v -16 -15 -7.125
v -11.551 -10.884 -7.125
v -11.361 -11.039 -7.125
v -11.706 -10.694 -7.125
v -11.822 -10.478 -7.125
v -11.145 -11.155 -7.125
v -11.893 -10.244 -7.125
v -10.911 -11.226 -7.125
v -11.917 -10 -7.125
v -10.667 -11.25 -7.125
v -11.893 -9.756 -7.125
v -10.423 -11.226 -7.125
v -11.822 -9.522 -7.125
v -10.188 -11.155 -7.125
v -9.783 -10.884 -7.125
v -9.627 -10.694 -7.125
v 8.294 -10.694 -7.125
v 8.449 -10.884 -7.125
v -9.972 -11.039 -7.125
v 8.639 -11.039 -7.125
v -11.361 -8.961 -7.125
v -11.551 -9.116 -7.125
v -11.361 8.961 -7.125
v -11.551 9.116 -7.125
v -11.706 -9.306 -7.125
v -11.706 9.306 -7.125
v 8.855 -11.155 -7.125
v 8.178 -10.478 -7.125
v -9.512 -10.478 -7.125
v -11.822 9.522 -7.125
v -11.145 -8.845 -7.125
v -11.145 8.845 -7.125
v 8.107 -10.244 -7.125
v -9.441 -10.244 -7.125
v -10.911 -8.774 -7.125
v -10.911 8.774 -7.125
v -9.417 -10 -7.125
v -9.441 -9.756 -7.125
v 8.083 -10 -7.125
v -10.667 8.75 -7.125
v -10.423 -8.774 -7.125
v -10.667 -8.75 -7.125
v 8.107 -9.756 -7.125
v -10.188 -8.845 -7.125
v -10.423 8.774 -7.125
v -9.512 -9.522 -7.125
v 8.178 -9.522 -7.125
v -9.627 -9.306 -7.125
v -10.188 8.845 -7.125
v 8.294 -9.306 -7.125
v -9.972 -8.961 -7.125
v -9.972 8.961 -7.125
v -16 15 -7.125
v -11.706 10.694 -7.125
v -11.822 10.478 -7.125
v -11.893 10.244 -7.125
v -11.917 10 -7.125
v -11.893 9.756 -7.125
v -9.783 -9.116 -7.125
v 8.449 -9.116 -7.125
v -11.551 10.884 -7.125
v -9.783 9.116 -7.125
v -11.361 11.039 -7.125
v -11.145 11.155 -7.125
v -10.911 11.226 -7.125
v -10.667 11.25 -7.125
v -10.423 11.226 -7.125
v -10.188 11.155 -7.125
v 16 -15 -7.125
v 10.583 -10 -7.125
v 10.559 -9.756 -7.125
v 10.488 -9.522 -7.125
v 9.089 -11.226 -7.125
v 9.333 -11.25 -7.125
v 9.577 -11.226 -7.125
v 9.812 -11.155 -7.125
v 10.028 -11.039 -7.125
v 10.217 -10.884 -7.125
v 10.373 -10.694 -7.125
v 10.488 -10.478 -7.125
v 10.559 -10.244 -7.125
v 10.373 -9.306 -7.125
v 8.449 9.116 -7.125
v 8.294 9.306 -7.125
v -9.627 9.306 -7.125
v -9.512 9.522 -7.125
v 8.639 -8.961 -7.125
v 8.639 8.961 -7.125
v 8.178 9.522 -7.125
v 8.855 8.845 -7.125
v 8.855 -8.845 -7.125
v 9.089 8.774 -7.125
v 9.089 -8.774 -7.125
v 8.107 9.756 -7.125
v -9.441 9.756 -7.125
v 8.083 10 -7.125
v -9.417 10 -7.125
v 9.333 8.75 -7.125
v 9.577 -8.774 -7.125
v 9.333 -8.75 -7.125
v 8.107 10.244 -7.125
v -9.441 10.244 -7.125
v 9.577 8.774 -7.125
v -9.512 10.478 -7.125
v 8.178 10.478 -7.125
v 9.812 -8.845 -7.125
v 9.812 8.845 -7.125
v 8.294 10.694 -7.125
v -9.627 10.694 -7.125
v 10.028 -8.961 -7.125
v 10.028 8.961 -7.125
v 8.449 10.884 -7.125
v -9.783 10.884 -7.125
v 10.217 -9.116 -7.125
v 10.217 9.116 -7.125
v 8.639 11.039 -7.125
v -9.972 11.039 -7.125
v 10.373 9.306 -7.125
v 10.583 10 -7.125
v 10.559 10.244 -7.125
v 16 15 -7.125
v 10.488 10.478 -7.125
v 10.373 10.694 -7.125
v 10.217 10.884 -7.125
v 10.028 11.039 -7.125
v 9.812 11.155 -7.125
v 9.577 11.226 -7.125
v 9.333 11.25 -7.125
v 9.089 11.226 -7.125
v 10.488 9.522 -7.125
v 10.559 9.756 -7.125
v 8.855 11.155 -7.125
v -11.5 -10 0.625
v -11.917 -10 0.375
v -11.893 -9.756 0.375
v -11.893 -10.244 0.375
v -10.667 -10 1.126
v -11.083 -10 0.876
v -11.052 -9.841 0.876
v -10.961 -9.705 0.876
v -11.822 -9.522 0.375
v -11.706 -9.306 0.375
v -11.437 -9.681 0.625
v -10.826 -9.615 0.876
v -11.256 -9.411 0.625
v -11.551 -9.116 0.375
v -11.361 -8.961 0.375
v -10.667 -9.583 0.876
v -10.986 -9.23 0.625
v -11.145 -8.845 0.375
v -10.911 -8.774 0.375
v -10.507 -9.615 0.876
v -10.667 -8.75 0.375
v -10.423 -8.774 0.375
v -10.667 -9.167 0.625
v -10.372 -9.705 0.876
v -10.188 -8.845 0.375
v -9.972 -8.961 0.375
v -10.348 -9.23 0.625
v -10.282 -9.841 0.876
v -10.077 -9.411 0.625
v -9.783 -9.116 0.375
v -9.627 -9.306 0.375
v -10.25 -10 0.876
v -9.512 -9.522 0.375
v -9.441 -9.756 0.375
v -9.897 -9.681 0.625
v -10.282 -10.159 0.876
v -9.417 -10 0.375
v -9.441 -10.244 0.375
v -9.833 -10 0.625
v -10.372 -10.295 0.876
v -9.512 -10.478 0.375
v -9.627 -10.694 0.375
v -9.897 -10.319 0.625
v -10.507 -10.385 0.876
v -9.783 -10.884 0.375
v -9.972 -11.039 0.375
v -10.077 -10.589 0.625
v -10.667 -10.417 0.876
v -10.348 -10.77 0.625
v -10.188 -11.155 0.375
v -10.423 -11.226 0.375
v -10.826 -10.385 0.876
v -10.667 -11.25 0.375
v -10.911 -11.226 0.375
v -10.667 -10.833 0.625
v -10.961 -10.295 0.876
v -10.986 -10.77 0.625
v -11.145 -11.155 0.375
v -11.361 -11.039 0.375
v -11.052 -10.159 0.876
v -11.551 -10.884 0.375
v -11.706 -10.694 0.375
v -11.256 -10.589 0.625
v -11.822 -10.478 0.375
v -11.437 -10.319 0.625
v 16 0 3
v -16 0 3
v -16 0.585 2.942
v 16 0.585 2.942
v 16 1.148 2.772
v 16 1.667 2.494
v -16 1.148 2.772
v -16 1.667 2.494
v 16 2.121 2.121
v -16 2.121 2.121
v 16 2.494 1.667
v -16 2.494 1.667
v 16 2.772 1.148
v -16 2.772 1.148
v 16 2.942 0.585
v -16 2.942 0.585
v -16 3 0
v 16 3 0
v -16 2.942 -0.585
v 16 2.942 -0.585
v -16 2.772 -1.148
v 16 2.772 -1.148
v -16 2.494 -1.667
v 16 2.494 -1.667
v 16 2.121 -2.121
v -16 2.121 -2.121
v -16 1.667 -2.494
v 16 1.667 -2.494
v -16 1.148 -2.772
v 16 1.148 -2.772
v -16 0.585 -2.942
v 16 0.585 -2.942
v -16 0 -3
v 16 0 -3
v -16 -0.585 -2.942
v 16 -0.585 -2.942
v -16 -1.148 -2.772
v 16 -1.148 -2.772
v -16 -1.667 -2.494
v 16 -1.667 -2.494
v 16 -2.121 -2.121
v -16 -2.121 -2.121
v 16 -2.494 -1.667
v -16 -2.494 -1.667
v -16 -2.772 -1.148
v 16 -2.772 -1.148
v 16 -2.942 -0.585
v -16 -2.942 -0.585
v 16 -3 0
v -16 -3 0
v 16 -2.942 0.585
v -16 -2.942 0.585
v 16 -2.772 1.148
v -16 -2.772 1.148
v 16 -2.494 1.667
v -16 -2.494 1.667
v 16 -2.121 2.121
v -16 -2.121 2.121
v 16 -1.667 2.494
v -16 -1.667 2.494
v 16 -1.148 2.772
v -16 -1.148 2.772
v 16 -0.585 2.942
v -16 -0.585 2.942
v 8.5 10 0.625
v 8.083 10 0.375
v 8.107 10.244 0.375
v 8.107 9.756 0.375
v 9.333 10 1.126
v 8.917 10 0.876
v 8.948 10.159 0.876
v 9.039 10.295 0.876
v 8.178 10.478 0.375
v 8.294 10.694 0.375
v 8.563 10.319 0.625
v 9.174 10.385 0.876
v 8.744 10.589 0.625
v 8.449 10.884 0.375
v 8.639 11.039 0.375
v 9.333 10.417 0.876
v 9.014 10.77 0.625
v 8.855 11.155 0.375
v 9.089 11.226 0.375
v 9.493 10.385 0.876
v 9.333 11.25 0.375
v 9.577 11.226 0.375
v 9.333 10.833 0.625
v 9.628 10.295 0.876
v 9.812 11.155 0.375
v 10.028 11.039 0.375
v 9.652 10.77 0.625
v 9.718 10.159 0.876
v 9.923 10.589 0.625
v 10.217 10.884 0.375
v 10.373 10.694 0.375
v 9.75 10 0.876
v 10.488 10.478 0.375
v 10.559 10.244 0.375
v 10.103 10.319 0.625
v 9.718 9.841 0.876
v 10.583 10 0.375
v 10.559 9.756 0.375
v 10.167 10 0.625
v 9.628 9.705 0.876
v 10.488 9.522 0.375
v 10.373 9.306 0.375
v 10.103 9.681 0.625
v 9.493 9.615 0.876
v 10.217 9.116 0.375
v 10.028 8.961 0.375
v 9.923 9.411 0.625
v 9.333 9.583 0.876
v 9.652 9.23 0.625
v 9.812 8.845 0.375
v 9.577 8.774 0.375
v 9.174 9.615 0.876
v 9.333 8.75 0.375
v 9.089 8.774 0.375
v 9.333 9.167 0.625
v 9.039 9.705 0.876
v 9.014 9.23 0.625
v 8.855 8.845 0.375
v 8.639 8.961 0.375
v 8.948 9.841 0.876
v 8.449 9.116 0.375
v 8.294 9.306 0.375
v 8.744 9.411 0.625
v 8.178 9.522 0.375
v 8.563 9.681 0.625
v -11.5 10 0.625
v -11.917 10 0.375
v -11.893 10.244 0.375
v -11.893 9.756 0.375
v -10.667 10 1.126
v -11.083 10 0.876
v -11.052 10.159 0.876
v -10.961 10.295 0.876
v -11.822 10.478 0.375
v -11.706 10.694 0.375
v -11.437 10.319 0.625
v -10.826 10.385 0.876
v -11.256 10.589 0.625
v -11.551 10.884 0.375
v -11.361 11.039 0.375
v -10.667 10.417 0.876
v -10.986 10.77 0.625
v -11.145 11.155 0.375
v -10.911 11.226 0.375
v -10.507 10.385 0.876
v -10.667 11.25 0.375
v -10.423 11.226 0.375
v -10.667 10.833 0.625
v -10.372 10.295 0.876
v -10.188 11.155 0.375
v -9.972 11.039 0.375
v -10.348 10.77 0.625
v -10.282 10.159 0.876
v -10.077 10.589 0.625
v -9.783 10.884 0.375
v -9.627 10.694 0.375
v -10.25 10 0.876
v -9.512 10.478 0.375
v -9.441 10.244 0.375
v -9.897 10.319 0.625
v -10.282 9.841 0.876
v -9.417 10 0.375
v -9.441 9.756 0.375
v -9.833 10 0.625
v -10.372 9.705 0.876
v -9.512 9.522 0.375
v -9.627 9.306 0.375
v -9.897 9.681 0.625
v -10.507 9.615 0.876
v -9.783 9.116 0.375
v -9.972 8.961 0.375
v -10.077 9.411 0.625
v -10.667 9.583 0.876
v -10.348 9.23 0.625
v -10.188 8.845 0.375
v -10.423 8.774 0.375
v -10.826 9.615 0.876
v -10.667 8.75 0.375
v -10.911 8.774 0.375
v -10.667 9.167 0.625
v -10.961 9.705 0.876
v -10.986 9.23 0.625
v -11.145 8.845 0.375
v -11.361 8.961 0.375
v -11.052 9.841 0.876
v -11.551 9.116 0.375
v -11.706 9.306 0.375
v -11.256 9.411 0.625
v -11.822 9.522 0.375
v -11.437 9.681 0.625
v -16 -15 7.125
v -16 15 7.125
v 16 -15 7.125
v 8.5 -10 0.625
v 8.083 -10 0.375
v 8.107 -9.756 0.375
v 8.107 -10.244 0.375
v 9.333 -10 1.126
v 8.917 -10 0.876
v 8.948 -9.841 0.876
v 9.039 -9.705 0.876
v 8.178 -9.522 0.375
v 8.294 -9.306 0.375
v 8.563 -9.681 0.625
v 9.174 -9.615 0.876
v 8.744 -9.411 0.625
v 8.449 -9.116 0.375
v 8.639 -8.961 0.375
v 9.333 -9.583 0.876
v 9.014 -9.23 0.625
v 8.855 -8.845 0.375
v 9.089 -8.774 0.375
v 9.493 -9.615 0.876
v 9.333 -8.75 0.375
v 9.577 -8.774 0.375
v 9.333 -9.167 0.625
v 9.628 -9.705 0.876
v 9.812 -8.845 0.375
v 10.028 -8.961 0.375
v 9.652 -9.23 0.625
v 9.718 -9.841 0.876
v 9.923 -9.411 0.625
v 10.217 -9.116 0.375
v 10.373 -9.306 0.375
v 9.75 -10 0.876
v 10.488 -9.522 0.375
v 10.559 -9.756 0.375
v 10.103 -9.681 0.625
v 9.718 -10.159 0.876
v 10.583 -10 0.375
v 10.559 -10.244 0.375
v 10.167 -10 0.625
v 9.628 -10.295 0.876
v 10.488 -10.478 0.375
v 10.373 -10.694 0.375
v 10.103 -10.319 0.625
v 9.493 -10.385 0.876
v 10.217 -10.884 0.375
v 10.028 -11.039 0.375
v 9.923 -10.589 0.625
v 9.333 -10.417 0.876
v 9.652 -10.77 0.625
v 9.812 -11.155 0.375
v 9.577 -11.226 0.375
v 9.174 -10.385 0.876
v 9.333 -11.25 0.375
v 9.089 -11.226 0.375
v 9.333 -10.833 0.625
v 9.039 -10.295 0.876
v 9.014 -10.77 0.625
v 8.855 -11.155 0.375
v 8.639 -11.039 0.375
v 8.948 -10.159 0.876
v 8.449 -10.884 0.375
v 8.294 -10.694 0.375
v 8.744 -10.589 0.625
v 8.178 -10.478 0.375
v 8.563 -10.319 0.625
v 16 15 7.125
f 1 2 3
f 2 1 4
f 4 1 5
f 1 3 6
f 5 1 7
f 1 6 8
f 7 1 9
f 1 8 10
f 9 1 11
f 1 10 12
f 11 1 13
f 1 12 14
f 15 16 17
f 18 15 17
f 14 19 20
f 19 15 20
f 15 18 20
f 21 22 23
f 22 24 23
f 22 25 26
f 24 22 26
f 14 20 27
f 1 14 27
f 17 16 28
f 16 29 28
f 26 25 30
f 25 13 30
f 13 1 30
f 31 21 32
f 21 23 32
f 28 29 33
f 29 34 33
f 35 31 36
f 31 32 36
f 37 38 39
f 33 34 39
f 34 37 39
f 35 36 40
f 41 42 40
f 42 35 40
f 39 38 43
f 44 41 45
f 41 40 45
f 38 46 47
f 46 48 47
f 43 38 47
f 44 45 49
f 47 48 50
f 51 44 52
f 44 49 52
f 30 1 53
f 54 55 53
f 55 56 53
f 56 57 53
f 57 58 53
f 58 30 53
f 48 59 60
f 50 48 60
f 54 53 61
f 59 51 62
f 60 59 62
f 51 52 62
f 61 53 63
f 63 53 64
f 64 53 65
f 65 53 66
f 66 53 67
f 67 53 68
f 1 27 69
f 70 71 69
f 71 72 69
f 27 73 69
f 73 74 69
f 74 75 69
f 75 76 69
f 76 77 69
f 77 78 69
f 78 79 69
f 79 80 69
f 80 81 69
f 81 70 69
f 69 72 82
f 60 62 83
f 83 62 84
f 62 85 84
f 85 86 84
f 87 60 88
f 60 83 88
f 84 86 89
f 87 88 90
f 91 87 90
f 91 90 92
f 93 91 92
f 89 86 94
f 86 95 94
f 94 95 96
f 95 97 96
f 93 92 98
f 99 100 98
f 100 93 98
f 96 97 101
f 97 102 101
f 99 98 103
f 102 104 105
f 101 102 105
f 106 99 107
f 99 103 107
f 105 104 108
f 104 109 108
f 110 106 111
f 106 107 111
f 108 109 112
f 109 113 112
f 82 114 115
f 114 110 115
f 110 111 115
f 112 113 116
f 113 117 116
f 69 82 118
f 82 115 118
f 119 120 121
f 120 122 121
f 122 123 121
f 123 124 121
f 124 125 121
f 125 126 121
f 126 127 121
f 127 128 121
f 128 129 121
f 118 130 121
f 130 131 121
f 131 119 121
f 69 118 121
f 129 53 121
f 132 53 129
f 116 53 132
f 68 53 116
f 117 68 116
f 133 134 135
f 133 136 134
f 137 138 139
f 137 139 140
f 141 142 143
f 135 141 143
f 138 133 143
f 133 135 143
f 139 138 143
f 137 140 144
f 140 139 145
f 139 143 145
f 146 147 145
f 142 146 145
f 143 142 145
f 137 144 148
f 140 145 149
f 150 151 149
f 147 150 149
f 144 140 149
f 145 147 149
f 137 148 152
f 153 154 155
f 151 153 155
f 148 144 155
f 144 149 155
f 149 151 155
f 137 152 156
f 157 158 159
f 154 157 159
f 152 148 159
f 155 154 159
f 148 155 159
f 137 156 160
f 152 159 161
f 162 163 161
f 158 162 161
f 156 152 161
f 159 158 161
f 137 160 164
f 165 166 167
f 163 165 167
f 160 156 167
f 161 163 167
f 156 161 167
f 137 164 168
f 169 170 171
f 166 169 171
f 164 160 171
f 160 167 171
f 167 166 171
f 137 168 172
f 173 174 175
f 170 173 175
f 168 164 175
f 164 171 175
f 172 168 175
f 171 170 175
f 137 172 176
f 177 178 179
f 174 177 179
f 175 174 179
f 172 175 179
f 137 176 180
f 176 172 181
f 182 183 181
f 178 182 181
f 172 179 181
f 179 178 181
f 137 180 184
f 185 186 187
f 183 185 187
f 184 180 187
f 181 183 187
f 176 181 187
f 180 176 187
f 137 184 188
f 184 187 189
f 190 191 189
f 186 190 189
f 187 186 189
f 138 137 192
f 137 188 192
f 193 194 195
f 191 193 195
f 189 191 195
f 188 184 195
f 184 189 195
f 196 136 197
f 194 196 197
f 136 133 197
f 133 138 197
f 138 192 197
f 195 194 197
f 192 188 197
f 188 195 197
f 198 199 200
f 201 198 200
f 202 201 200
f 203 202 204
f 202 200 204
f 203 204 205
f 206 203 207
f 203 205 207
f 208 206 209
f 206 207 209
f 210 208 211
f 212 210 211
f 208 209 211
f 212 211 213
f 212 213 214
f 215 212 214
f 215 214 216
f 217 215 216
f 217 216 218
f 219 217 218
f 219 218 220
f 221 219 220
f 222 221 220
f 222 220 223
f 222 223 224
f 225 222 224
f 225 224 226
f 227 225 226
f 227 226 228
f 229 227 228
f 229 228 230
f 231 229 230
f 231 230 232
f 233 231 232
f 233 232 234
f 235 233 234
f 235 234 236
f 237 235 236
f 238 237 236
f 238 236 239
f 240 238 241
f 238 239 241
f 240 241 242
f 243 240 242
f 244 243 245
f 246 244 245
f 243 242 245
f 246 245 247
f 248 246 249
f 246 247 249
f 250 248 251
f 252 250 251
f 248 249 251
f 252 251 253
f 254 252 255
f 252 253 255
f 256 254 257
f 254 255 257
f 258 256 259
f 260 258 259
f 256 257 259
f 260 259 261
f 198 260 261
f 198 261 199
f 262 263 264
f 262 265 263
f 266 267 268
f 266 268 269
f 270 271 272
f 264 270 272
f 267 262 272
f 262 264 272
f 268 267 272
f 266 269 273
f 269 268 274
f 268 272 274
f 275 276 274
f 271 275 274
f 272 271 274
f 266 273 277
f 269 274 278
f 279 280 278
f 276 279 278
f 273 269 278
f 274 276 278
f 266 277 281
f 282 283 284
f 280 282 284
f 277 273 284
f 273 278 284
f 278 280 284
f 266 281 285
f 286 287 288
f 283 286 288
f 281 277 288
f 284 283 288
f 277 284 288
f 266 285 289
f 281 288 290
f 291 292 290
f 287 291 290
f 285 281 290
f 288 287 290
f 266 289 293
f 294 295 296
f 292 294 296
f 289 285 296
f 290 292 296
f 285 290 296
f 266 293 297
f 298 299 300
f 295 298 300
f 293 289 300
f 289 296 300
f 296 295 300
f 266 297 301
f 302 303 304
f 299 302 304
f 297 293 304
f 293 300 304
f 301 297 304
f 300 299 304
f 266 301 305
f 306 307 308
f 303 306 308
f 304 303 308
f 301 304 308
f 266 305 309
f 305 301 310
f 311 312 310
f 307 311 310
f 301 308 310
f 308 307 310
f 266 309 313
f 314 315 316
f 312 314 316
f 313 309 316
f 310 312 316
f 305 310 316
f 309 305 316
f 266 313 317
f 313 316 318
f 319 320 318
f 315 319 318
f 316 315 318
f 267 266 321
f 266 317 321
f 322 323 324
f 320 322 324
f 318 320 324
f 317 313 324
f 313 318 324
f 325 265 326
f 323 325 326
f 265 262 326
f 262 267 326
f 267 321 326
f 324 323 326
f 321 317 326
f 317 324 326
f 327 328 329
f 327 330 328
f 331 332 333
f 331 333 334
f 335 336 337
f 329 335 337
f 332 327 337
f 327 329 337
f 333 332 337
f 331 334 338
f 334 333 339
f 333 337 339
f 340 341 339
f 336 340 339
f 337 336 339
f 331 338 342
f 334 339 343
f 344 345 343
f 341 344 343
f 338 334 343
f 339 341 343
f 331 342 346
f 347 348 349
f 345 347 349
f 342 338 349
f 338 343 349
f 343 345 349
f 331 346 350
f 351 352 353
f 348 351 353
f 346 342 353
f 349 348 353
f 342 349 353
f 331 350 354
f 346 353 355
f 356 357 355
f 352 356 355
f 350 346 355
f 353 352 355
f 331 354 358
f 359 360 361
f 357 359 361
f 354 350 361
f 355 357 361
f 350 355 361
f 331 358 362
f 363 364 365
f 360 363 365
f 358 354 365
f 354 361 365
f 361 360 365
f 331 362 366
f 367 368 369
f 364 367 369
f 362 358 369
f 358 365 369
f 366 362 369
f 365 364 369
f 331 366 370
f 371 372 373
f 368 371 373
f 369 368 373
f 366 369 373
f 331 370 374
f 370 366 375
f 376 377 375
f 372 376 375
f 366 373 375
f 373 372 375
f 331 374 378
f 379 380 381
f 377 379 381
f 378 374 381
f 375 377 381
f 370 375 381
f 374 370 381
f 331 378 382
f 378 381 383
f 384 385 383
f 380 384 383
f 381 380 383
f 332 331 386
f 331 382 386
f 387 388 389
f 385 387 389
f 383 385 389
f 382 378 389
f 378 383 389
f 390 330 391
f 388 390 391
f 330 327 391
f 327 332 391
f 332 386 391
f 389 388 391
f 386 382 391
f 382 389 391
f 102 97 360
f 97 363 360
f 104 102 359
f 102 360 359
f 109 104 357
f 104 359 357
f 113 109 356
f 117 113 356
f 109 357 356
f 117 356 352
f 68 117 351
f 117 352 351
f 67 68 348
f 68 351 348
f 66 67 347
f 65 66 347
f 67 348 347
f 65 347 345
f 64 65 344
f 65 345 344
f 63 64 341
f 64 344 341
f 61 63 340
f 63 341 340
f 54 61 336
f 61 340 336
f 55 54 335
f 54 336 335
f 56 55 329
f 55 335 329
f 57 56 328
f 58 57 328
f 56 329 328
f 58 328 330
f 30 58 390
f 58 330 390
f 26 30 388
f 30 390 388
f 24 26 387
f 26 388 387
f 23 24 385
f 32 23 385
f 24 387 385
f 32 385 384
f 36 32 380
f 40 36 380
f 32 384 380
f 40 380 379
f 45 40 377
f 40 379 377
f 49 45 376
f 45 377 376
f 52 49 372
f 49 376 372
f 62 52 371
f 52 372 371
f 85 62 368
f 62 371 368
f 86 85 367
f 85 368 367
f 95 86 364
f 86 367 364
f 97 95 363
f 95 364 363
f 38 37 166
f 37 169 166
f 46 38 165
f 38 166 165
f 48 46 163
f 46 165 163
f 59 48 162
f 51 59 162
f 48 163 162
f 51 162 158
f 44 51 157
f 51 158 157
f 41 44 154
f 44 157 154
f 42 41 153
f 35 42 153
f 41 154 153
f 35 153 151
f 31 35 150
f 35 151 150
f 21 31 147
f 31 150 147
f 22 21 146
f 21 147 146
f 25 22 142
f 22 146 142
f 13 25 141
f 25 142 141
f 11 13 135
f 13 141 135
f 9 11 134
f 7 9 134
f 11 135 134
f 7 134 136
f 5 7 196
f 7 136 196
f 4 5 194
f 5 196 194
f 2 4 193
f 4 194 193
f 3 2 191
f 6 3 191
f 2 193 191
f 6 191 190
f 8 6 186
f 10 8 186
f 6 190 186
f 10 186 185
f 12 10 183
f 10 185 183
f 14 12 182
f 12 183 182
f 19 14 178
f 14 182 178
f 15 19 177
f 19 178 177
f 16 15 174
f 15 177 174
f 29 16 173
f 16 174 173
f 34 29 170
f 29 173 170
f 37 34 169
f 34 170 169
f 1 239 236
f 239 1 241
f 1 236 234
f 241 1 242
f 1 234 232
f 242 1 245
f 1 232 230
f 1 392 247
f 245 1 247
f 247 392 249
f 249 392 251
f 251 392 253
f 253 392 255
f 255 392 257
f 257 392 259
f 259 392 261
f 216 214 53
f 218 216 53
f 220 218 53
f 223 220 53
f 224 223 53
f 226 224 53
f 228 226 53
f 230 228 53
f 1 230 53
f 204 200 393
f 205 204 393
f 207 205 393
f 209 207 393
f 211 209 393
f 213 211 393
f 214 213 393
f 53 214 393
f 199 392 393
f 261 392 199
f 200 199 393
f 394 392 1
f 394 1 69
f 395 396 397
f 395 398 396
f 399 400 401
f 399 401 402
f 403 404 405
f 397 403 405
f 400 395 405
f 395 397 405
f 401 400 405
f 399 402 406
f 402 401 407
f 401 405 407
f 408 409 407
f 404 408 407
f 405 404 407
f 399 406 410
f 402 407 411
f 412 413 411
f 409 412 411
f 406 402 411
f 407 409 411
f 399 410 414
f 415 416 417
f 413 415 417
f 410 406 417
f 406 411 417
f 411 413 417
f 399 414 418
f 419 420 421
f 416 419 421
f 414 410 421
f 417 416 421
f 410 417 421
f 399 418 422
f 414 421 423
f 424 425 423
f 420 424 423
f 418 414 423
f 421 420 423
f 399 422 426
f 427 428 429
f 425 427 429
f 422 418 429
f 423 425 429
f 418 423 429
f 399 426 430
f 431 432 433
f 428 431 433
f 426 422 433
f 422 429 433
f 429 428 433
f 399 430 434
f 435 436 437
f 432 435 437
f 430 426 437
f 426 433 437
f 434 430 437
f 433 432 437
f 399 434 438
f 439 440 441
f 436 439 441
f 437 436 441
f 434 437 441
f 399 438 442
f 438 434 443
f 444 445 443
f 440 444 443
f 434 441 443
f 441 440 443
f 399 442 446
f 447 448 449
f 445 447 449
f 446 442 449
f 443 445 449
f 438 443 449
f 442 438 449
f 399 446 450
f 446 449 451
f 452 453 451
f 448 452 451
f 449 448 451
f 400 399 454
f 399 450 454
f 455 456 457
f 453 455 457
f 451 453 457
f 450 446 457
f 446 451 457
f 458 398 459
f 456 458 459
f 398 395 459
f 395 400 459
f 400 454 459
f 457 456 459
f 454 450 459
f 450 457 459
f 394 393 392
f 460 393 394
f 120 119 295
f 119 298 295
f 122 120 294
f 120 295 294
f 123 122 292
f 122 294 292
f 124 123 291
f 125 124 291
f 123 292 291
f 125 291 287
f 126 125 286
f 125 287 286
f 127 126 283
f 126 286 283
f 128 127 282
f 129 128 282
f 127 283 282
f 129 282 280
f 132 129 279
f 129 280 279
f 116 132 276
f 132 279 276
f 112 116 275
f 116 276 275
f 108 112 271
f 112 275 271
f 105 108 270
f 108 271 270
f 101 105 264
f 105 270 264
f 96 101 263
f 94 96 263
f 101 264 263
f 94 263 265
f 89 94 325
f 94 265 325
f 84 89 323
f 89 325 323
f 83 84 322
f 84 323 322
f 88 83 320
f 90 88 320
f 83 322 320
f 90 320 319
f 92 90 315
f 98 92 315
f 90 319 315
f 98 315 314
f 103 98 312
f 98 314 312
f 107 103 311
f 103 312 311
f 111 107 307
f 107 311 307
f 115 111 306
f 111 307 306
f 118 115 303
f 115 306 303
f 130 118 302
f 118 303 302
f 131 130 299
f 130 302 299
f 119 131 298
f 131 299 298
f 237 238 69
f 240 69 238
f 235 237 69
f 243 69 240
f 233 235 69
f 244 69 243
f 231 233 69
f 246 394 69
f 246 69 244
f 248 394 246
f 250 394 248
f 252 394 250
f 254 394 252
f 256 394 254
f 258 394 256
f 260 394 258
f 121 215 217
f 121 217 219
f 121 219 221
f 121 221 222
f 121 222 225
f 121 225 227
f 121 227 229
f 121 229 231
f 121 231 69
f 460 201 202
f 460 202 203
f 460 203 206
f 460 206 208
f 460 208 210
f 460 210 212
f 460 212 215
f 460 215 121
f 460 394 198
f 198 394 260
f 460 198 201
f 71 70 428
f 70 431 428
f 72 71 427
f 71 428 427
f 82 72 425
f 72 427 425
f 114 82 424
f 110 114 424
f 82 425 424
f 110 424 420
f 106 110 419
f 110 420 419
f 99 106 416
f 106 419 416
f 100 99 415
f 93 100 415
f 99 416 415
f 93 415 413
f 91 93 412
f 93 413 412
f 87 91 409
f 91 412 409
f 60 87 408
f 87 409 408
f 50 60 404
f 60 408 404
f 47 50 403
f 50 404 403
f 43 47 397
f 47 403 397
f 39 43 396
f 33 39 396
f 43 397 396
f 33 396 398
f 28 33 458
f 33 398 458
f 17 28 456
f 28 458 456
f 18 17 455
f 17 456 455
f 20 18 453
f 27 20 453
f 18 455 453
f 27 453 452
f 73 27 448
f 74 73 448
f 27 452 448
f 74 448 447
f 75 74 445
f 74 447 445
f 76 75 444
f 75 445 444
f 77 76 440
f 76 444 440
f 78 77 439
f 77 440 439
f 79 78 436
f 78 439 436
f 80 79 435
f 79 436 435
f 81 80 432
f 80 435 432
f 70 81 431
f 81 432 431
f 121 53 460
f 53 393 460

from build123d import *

# Parameters (mm, degrees)
SKETCH1_W                 = 32
SKETCH1_H                 = 30
BOSS_EXTRUDE1_DEPTH       = 7.125
M3X0_5_TAPPED_HOLE1_D     = 2.5
M3X0_5_TAPPED_HOLE1_DEPTH = 7.5
M3X0_5_TAPPED_HOLE1_TIP   = 0.751075774
M6X1_0_TAPPED_HOLE1_D     = 6


with BuildPart() as part:
    # Sketch1 → Boss-Extrude1 (new, symmetric)
    with BuildSketch(Plane.XY):
        Rectangle(SKETCH1_W, SKETCH1_H)
    extrude(amount=BOSS_EXTRUDE1_DEPTH, both=True)

    # M3x0.5 Tapped Hole1
    with Locations(Plane(origin=(0, 0, -7.125), x_dir=(-1, 0, 0), z_dir=(0, 0, -1))):
        with Locations((-9.333333333, 10), (10.666666667, 10), (10.666666667, -10), (-9.333333333, -10)):
            Hole(M3X0_5_TAPPED_HOLE1_D / 2, depth=M3X0_5_TAPPED_HOLE1_DEPTH)
            with Locations((0, 0, -(M3X0_5_TAPPED_HOLE1_DEPTH + M3X0_5_TAPPED_HOLE1_TIP / 2))):  # 118° drill point
                Cone(0, M3X0_5_TAPPED_HOLE1_D / 2, M3X0_5_TAPPED_HOLE1_TIP, mode=Mode.SUBTRACT)

    # M6x1.0 Tapped Hole1 (through all)
    with Locations(Plane(origin=(16, 0, 0), x_dir=(0, 0, -1), z_dir=(1, 0, 0))):
        with Locations((0, 0)):
            Hole(M6X1_0_TAPPED_HOLE1_D / 2)


solid = part.part
